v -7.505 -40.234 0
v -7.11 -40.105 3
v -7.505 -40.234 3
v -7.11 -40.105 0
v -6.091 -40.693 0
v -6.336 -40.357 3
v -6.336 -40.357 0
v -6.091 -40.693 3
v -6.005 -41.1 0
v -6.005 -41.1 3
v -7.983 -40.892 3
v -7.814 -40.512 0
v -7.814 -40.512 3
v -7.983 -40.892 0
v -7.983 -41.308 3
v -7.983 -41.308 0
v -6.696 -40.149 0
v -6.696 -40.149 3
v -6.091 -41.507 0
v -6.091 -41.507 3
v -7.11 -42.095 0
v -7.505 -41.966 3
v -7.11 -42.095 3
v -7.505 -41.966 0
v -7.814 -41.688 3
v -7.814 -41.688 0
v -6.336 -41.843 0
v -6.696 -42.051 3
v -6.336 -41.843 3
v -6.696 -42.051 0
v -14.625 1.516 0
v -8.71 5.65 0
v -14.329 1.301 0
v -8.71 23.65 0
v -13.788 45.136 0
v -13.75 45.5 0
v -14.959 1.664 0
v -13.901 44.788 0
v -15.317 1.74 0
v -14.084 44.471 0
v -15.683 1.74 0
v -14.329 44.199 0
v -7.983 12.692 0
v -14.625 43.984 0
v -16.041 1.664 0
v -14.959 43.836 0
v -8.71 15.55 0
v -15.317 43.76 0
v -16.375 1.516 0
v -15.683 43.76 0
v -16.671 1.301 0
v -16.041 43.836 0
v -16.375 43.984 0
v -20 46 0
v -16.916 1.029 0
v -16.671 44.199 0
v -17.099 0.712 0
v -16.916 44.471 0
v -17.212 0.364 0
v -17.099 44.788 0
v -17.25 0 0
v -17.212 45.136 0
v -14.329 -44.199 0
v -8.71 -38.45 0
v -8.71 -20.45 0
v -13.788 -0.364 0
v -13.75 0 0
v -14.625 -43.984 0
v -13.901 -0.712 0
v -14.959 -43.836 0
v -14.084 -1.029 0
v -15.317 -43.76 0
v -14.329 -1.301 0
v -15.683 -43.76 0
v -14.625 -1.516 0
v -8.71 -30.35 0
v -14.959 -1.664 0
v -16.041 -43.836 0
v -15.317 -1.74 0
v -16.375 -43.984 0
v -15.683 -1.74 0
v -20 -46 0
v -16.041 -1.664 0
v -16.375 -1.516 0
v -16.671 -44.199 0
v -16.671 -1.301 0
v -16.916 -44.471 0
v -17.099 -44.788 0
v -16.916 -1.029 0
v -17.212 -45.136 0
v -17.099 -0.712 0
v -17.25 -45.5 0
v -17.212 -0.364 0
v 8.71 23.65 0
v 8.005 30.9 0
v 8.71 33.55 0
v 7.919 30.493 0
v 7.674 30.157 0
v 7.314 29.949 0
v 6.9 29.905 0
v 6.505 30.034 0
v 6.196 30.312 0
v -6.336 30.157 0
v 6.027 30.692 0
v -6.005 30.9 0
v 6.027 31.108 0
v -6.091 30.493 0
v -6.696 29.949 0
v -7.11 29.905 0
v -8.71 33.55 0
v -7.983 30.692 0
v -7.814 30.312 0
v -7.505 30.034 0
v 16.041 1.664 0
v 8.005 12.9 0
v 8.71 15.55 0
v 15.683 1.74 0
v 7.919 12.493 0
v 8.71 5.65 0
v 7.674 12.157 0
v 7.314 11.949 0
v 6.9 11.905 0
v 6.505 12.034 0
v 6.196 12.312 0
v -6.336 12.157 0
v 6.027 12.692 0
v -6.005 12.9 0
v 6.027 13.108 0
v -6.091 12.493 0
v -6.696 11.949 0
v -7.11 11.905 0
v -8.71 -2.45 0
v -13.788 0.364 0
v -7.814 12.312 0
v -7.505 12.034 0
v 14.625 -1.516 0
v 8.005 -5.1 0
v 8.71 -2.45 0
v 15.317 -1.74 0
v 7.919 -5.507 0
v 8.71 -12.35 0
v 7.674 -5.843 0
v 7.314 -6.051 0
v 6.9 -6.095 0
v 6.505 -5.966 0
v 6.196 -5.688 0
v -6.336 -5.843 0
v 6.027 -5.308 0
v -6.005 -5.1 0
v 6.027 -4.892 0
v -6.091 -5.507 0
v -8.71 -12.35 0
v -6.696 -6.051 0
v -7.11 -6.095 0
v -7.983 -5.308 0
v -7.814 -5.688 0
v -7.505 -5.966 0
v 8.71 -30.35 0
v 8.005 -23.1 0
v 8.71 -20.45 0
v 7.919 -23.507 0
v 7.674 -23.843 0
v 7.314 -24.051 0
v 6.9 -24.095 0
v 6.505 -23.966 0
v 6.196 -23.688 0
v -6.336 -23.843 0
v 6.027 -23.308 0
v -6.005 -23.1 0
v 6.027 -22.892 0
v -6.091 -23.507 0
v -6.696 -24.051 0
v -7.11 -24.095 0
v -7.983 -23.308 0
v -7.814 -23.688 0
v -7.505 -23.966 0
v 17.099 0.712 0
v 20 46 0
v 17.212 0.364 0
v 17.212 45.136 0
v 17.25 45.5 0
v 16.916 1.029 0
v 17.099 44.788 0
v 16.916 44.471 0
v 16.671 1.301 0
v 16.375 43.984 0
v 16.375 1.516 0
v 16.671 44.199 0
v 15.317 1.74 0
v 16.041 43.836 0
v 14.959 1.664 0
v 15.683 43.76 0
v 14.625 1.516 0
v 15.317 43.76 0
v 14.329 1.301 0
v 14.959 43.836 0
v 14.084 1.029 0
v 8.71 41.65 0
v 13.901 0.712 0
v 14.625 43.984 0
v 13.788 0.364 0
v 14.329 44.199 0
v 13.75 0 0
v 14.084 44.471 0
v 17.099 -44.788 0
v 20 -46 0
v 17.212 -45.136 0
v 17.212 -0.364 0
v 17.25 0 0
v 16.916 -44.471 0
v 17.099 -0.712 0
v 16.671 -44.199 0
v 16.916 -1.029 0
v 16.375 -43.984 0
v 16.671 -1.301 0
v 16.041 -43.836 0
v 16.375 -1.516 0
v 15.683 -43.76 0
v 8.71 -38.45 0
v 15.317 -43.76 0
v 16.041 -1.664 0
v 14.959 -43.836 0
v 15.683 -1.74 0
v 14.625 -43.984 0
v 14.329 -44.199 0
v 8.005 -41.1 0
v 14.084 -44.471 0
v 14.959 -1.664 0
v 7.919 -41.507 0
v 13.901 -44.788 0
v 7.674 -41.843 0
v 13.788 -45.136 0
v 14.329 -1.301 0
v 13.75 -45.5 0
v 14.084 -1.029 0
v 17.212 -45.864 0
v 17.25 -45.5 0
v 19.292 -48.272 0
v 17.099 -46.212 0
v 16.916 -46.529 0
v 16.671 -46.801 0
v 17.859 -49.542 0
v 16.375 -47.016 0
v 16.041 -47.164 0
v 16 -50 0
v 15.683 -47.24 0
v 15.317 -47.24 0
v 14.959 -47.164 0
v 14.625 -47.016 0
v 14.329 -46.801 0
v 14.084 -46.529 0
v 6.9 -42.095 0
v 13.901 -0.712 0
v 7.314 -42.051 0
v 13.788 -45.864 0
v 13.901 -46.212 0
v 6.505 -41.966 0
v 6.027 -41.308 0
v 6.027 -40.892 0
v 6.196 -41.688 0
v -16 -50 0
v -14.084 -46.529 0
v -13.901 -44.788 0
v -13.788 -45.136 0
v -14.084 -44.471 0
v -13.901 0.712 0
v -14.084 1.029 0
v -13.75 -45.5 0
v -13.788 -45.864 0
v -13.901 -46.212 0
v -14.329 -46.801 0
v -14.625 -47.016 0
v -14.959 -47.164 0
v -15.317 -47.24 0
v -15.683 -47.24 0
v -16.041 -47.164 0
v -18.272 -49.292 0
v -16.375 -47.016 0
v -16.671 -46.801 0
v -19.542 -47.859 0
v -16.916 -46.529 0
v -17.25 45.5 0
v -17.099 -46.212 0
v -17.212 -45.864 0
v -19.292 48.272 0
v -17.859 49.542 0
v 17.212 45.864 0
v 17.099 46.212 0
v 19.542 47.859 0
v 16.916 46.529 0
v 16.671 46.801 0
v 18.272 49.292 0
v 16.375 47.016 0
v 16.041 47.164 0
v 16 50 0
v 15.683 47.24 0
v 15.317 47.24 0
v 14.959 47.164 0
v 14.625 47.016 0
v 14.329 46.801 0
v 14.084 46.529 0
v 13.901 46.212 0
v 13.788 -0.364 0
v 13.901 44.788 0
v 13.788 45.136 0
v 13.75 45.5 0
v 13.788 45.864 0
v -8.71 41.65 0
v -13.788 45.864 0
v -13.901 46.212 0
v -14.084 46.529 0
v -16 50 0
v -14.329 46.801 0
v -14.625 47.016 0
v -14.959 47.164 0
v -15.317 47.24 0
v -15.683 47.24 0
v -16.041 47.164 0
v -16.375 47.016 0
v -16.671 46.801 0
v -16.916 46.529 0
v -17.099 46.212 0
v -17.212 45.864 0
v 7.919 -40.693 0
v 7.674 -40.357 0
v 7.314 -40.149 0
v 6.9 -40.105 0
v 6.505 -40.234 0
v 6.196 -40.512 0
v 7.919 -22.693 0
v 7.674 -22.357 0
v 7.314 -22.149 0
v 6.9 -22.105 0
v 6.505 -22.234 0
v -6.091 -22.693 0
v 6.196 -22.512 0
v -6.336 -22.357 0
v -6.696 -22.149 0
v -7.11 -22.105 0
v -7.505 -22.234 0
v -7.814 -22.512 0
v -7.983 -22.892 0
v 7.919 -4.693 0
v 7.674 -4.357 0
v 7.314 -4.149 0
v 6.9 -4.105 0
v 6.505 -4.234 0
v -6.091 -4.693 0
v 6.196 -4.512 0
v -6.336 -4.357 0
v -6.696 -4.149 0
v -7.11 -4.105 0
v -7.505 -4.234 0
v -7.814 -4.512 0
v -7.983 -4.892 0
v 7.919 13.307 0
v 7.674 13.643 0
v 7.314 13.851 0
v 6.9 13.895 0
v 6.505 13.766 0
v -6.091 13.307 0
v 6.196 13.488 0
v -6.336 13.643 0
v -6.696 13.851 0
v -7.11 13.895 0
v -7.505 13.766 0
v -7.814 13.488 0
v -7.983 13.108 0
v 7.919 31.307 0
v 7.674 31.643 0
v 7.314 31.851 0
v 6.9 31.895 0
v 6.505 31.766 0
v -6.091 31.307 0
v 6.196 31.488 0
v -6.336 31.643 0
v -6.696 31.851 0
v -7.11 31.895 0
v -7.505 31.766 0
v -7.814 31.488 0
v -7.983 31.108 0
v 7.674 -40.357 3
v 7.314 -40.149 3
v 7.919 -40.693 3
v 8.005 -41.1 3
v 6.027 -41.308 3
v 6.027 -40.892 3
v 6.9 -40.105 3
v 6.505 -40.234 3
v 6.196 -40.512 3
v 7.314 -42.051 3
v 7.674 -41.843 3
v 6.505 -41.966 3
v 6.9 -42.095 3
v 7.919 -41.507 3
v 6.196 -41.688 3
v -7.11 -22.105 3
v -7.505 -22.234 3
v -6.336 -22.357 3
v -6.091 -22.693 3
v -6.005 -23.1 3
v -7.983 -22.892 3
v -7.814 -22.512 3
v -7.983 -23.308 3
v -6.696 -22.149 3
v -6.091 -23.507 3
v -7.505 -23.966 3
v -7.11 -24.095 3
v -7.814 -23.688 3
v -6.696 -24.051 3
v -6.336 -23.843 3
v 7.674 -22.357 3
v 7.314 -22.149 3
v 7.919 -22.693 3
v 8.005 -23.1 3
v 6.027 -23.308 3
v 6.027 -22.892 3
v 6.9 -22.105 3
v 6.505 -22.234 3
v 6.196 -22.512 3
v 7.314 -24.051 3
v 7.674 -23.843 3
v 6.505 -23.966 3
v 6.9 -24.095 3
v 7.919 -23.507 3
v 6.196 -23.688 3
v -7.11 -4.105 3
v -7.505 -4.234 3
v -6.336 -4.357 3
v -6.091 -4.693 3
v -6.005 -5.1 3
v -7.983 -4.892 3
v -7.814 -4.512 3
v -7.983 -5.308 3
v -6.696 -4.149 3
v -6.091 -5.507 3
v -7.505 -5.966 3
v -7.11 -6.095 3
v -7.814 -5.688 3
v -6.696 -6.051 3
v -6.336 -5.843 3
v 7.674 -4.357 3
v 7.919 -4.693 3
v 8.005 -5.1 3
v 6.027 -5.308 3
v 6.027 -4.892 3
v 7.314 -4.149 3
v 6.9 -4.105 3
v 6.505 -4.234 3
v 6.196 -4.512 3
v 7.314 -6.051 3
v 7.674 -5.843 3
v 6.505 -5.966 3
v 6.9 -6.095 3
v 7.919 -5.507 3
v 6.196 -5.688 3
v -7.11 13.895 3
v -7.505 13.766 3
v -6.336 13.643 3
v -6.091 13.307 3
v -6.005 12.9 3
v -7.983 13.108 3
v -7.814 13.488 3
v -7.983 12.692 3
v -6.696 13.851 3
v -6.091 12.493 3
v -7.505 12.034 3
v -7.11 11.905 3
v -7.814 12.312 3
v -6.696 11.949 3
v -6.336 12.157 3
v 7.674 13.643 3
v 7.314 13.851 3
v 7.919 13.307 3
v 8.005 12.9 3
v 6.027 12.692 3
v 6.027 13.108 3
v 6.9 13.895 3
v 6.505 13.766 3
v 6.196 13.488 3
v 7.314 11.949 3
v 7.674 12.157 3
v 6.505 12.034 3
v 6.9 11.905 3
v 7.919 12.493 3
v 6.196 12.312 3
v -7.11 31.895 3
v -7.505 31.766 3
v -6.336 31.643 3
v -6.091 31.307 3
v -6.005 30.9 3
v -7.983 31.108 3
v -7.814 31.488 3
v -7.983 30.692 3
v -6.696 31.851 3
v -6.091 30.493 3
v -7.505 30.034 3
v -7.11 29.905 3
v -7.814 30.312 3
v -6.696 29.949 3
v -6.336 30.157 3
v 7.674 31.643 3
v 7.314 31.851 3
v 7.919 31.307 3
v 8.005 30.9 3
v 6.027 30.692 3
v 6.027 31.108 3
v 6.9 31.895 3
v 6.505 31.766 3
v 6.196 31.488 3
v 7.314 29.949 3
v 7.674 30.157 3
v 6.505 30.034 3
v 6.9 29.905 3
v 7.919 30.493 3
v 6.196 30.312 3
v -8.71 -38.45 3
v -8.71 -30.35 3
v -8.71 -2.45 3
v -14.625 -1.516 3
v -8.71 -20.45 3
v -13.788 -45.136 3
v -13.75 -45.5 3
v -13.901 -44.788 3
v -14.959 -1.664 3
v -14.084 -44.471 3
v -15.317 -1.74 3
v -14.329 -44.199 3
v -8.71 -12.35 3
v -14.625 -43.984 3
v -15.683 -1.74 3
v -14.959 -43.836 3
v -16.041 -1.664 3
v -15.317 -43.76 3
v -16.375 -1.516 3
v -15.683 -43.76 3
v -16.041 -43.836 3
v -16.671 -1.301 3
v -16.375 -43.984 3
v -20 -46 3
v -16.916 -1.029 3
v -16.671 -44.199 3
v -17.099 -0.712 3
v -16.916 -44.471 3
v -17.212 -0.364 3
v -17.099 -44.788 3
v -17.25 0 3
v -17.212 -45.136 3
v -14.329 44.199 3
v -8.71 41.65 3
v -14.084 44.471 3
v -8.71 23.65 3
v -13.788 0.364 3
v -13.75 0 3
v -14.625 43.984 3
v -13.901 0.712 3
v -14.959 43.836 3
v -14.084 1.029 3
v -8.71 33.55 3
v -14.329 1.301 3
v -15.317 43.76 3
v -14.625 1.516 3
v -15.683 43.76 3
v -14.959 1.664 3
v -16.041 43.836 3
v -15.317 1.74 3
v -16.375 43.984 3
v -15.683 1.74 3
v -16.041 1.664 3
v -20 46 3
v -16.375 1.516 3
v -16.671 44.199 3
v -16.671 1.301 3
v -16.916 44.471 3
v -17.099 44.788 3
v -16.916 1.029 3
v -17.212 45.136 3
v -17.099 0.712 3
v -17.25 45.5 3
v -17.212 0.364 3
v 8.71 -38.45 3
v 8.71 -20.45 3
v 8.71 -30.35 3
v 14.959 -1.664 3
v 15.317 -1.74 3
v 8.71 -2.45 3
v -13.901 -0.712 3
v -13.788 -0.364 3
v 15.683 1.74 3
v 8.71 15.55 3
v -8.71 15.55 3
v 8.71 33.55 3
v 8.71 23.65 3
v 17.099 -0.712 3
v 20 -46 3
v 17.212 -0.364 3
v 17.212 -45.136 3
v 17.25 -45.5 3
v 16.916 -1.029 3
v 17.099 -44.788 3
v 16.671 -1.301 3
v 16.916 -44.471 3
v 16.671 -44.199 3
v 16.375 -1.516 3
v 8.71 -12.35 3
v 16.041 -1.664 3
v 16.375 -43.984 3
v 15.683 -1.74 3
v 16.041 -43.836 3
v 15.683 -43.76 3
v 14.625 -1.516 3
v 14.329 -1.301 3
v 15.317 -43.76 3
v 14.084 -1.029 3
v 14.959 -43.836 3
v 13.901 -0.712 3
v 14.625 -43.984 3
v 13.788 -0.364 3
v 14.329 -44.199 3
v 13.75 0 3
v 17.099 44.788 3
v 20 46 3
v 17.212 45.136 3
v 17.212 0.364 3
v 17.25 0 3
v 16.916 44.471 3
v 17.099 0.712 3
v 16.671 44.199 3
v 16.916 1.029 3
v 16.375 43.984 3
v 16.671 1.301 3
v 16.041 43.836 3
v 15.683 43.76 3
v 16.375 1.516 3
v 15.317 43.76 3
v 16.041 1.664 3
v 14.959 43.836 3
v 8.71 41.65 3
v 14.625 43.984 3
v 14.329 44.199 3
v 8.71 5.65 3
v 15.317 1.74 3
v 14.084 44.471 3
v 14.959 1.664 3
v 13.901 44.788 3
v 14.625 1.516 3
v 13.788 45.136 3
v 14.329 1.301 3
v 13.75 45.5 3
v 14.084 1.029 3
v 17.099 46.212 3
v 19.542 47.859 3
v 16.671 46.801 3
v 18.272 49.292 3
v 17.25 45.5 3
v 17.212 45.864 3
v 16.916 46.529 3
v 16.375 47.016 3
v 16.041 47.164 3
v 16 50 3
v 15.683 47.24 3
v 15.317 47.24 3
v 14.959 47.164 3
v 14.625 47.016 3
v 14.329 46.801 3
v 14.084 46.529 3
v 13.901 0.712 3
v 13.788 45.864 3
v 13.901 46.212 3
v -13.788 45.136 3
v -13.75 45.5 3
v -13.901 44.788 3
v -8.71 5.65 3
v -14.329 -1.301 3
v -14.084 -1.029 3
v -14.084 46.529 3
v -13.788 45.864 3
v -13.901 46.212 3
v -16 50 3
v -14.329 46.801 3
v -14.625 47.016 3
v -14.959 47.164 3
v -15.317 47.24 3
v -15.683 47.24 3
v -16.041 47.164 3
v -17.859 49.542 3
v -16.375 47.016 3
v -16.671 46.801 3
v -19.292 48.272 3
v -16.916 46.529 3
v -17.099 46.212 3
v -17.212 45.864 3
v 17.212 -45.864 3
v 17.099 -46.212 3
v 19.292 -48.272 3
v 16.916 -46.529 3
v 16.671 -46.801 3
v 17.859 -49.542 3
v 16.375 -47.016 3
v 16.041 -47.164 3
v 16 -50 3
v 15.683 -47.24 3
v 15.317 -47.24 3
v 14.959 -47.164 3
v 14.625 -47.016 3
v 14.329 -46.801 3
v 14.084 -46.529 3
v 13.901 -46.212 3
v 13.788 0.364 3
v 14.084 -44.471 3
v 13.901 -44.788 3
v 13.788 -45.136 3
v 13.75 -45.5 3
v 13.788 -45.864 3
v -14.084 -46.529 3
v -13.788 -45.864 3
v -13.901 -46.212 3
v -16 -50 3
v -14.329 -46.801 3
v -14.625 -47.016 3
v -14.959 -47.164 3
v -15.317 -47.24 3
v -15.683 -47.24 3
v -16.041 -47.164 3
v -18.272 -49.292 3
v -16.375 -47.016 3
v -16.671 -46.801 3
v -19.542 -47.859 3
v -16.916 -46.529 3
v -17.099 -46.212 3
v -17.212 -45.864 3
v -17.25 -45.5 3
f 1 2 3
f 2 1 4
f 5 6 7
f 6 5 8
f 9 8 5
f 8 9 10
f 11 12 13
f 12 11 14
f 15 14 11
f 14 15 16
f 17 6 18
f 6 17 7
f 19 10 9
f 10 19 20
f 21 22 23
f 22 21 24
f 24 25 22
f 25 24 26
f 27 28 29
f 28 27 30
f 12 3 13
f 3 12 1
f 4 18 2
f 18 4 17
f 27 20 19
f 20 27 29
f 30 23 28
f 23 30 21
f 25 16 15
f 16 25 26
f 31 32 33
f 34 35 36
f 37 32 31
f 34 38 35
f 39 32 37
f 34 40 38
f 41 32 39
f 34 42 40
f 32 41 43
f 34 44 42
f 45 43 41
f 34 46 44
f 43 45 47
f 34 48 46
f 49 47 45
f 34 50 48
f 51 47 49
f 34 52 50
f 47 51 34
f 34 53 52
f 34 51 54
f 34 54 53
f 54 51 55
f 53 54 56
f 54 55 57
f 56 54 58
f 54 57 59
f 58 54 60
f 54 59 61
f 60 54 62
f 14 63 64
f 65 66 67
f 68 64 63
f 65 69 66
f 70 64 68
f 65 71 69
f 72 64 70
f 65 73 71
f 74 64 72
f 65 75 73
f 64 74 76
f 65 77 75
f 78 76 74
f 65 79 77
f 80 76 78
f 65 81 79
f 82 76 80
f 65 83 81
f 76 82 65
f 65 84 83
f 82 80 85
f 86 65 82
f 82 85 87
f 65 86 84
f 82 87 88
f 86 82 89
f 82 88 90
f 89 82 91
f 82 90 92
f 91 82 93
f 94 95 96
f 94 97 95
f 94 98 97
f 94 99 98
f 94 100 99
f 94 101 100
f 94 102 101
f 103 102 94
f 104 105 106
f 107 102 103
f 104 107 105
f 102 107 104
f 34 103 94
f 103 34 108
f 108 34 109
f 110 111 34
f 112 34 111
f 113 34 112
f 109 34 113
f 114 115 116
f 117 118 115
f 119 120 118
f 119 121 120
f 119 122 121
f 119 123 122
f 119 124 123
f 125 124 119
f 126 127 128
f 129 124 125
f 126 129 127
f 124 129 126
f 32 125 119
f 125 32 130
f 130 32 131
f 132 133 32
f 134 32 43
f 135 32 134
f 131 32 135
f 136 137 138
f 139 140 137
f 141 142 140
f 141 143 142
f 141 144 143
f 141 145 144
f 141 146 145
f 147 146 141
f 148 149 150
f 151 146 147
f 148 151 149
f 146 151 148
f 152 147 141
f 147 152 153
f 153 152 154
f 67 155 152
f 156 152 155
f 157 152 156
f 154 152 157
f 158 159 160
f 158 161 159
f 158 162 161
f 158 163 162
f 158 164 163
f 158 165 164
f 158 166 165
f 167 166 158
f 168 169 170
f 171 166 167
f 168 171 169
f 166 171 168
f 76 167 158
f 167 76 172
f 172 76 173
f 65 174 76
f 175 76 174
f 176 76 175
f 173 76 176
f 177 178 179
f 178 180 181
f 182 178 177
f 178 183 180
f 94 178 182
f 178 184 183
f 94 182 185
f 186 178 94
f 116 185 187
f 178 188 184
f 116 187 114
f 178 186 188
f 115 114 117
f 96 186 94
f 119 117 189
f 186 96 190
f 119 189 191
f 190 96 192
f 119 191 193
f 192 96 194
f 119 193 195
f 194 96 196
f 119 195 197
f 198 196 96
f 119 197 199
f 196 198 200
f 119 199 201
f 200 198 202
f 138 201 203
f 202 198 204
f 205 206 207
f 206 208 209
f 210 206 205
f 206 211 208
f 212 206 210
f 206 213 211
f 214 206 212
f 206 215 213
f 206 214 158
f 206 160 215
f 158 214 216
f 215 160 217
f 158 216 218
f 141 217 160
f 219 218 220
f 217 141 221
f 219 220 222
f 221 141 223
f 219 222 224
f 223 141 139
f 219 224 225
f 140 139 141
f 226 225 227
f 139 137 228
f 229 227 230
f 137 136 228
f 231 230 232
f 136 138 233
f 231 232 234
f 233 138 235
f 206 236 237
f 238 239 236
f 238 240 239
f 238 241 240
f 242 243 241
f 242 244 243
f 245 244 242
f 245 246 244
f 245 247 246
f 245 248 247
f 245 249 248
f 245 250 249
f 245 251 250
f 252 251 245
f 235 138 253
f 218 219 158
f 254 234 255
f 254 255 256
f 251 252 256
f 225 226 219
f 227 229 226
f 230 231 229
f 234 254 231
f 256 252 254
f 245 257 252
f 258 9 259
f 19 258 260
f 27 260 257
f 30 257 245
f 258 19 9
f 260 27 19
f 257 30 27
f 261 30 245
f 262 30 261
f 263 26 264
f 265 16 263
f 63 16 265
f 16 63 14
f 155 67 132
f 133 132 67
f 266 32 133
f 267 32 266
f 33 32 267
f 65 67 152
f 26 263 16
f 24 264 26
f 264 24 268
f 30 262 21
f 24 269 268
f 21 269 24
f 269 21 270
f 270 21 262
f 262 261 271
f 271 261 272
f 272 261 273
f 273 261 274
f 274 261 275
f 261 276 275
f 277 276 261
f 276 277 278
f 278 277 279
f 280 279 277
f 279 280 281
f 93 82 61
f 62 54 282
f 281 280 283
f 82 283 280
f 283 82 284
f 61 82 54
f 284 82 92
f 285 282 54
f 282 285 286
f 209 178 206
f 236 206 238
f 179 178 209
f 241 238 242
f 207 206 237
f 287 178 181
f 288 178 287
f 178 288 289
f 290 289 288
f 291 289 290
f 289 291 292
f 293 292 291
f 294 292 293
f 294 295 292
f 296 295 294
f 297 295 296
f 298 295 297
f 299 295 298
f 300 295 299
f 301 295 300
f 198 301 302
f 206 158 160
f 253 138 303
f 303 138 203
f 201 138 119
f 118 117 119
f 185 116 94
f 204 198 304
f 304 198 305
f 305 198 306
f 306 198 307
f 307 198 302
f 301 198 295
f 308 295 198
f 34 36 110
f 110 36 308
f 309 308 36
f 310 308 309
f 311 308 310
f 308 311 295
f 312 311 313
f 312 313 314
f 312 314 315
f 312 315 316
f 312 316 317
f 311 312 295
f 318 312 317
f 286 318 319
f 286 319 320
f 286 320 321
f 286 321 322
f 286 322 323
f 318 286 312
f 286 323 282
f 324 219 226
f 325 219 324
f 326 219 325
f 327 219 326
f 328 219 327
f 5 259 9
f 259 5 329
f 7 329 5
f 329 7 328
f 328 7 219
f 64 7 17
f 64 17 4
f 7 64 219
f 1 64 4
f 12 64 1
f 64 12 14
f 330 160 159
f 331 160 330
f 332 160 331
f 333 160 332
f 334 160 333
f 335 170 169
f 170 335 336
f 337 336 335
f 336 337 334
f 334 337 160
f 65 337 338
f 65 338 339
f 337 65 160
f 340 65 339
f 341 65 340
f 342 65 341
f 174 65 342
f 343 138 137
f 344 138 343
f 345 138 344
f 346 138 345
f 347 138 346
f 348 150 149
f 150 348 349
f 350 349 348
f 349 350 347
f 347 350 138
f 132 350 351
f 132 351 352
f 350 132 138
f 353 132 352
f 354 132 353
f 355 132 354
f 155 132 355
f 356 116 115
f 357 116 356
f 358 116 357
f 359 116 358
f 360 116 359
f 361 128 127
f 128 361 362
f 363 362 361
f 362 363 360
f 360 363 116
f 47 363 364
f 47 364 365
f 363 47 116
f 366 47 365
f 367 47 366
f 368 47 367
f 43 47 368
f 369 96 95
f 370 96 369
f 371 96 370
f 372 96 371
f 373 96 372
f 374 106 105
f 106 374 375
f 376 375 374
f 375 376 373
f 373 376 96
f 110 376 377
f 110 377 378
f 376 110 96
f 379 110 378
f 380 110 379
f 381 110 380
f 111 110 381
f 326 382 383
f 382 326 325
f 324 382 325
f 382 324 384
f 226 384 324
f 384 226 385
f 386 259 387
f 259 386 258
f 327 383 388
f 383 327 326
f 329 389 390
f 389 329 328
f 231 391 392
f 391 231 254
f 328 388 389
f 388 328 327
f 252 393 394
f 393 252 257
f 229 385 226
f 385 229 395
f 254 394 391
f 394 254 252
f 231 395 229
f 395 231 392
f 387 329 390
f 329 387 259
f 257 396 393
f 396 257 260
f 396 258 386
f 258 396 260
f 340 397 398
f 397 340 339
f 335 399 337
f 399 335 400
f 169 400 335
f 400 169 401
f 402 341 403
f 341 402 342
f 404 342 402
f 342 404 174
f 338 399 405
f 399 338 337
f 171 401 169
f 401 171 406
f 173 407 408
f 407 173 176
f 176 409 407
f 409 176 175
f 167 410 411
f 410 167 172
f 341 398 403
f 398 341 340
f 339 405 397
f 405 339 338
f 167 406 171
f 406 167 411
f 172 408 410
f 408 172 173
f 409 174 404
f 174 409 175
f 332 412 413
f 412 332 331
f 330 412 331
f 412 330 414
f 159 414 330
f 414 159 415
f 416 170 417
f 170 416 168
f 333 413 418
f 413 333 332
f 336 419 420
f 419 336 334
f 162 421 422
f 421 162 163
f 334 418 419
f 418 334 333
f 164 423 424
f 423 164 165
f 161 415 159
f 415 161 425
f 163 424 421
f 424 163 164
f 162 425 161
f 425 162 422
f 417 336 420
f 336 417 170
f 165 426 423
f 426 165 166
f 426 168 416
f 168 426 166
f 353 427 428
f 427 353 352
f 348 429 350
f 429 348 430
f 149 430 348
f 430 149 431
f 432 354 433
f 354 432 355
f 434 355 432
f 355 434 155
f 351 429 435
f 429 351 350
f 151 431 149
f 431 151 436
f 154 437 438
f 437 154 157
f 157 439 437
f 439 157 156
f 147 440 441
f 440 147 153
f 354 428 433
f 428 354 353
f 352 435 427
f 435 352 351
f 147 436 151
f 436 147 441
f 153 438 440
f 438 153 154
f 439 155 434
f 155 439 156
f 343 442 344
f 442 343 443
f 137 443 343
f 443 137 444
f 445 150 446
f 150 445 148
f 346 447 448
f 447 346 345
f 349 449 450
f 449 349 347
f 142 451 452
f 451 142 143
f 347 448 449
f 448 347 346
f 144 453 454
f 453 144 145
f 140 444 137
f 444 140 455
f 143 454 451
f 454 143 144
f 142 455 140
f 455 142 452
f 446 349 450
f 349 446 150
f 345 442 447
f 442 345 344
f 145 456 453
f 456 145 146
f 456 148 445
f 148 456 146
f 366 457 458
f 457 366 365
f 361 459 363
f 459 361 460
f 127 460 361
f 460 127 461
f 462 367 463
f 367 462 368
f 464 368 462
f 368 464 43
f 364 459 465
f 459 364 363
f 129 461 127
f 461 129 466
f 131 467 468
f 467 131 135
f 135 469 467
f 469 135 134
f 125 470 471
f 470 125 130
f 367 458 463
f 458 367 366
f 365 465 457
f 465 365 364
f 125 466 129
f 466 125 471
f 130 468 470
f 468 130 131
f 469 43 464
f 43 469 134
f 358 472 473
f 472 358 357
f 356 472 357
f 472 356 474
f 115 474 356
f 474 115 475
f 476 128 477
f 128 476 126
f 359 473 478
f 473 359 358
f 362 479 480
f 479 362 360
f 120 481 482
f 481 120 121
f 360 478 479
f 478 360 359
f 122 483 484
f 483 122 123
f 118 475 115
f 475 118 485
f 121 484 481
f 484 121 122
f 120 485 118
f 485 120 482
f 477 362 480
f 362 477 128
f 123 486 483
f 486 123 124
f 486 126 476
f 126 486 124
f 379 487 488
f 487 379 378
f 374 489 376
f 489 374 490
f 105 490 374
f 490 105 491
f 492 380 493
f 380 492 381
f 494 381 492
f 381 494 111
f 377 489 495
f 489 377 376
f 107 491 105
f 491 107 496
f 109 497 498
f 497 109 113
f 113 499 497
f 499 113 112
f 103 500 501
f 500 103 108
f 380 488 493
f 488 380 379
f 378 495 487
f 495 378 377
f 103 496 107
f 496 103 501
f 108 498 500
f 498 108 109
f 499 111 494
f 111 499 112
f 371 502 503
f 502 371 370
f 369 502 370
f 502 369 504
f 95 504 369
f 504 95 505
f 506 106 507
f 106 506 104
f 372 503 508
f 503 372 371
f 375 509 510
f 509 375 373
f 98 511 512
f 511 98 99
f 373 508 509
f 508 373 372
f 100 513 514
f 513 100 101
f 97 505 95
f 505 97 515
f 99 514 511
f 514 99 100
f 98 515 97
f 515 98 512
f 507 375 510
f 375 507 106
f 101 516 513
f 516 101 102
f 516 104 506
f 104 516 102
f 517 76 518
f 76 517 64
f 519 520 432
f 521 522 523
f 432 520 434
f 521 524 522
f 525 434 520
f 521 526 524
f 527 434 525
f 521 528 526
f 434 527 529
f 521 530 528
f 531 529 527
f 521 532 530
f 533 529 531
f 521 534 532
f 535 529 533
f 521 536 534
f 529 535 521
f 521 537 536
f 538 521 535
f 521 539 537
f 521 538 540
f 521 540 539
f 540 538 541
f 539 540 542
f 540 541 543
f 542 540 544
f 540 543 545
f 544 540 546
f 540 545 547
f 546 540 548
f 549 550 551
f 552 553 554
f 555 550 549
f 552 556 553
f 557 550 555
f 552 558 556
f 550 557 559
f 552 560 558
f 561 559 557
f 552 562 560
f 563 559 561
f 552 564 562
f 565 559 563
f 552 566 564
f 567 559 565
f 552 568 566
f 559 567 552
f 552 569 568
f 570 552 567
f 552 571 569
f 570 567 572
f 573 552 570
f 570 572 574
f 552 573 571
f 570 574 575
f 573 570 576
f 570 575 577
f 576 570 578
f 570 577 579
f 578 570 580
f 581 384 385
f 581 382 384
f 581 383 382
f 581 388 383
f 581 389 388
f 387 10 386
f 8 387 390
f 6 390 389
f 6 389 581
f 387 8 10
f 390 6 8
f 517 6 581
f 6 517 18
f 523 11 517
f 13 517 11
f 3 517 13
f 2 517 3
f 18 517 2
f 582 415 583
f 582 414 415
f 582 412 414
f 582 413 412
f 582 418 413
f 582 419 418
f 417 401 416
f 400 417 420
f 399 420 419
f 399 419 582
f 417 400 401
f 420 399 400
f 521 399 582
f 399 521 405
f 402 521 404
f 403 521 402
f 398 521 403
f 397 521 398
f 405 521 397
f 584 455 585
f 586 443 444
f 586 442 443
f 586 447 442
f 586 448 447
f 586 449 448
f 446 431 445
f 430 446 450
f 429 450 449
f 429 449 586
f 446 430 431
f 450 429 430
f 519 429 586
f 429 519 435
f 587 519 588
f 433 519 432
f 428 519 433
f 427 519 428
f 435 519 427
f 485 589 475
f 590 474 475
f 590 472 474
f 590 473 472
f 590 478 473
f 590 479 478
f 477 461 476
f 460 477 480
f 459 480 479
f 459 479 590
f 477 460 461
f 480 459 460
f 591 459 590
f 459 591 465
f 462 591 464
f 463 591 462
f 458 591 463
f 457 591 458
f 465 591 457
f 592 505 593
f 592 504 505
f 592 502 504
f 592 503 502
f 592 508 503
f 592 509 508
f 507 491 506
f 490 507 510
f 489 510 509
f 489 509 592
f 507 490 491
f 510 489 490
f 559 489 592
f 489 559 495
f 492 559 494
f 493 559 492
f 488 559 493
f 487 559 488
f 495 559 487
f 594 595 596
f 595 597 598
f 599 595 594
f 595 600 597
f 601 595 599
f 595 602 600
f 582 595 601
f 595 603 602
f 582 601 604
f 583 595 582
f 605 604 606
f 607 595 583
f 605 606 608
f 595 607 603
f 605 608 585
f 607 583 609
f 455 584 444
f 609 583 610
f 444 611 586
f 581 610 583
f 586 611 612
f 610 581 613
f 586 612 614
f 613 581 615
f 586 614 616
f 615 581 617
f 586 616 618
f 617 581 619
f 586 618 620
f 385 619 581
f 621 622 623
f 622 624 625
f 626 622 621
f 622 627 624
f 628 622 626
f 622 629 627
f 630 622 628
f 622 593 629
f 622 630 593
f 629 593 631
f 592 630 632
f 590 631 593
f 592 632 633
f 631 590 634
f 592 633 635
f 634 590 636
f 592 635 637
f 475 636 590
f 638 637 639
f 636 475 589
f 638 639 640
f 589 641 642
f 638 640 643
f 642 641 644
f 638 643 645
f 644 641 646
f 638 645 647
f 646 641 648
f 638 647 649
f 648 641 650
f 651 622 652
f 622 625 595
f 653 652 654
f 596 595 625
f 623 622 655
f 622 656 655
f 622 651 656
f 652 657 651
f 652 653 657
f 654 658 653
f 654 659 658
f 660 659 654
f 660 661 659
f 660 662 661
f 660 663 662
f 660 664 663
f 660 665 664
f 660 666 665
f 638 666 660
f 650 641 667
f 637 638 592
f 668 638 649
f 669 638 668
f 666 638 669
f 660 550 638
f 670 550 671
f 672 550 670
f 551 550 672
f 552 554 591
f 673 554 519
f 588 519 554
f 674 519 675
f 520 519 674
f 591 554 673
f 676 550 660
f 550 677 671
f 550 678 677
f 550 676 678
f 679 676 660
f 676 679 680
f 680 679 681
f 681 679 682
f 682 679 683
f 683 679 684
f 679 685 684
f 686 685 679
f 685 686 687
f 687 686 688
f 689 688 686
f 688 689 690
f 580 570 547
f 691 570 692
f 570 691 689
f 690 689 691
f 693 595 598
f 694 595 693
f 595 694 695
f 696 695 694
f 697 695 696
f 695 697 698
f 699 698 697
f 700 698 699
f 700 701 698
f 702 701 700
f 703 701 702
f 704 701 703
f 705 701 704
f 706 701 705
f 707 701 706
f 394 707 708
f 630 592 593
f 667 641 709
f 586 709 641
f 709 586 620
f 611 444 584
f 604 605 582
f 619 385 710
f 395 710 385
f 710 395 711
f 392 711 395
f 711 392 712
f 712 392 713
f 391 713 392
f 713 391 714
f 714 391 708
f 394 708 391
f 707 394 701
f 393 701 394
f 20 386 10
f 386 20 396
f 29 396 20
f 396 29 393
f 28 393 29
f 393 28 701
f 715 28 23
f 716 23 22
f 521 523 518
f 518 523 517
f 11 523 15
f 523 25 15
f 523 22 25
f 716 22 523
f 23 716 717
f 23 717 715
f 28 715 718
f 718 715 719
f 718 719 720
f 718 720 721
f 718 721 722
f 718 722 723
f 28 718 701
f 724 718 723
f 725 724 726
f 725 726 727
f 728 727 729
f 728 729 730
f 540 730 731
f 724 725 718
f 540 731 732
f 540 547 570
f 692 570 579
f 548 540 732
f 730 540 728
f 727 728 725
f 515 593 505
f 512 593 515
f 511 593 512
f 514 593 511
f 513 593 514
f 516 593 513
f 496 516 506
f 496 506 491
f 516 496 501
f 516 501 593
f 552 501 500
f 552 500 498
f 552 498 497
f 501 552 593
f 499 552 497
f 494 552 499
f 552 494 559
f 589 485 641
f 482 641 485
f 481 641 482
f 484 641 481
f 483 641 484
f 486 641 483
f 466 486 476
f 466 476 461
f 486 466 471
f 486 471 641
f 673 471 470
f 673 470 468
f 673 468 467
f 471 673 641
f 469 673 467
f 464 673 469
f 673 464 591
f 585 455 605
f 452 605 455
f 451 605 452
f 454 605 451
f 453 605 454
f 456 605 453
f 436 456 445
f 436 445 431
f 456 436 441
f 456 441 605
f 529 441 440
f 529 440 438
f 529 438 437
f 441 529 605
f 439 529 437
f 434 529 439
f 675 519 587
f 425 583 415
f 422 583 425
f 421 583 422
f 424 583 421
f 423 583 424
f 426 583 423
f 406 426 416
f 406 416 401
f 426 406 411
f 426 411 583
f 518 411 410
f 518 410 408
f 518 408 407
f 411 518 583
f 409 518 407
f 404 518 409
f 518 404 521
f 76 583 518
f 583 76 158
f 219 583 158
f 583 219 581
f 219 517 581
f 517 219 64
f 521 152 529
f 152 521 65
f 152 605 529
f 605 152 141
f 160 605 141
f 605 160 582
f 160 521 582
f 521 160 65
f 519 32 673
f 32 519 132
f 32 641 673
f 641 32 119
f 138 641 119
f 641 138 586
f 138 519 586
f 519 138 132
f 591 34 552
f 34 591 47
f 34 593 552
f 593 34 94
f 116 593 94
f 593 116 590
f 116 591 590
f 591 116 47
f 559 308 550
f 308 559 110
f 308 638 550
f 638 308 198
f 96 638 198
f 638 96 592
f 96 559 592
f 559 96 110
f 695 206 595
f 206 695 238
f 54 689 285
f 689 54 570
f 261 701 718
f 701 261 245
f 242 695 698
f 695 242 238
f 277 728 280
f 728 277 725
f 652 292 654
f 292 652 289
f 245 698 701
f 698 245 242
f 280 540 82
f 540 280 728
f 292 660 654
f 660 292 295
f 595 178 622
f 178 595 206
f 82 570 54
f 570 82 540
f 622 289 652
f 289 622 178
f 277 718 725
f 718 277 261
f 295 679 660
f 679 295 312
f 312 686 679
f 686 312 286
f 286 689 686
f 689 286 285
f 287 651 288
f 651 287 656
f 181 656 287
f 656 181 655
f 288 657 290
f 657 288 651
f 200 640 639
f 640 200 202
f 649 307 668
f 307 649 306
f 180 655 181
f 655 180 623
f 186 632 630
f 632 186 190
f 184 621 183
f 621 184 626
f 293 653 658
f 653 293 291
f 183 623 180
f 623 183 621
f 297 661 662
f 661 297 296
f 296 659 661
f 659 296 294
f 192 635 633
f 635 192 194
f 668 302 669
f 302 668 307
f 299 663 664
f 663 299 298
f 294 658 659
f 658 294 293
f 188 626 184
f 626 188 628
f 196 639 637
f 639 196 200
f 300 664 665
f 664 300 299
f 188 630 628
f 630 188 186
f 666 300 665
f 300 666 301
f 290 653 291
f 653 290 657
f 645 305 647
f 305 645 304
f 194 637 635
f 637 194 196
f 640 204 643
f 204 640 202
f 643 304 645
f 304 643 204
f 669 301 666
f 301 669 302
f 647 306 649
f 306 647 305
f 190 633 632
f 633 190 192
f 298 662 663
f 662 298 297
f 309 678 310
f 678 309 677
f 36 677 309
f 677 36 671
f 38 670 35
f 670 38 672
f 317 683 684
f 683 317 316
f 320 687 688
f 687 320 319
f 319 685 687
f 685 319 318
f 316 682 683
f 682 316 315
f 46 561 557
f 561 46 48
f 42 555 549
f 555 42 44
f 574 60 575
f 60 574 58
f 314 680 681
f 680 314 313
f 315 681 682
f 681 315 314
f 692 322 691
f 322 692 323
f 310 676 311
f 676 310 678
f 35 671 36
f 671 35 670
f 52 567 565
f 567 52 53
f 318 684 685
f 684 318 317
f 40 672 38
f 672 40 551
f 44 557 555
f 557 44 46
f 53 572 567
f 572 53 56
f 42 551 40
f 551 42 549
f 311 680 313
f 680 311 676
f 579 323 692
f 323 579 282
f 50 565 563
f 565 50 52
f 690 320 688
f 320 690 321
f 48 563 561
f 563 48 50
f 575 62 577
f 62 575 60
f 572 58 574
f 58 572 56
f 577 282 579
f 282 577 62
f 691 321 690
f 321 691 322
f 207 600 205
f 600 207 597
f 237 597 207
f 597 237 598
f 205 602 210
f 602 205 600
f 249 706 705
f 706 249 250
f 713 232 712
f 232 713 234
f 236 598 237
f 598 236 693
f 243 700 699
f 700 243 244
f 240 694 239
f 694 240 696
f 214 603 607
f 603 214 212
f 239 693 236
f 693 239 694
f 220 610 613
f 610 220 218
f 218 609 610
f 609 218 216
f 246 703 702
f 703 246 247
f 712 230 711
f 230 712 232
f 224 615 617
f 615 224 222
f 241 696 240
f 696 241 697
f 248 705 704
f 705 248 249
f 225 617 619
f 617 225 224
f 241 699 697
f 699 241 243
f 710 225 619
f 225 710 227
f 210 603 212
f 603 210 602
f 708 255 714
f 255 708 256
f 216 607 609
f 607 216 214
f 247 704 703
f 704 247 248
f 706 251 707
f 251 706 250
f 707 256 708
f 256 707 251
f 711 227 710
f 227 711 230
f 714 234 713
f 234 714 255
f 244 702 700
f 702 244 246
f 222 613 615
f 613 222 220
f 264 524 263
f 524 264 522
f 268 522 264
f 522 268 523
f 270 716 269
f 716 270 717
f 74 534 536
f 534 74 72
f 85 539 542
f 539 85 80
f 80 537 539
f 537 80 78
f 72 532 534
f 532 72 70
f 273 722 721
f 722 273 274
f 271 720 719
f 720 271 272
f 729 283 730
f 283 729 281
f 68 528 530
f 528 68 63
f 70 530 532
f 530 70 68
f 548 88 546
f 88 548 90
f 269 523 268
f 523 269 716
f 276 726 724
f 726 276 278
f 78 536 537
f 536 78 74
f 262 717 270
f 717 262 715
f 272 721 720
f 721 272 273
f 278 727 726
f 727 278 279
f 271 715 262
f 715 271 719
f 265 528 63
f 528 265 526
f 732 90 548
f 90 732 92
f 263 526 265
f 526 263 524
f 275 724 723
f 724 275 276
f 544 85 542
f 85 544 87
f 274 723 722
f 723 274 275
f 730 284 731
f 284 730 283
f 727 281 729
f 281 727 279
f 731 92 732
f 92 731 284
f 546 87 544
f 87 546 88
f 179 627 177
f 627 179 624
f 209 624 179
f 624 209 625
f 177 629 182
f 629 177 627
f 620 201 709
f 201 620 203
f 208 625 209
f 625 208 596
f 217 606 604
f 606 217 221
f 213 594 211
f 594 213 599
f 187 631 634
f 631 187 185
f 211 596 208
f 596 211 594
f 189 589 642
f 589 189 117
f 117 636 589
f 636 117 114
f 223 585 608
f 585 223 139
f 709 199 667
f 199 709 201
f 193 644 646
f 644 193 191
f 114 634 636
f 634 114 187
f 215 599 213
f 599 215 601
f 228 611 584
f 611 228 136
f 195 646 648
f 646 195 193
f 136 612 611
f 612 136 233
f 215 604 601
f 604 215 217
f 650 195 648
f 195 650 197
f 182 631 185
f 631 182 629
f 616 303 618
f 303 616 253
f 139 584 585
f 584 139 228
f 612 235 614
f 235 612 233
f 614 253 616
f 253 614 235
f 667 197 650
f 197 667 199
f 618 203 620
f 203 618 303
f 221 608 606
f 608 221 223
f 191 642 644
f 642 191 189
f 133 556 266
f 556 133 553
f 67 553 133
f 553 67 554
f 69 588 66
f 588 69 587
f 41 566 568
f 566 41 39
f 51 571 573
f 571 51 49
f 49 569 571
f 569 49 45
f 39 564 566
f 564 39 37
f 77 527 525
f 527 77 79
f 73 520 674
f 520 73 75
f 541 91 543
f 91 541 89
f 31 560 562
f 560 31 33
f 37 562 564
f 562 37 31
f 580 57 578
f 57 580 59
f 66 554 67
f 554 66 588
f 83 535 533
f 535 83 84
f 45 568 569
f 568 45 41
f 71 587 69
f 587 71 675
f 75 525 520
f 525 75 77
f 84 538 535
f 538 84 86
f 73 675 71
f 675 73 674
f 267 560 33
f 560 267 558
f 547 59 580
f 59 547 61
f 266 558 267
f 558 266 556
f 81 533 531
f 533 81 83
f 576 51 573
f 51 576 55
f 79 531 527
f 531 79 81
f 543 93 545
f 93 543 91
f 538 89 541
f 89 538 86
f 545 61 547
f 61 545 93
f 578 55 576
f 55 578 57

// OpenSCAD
// ==========================
// PARAMETERS (easy to edit)
// ==========================

// Main box
BOX_W = 40;      // width  (X)
BOX_L = 100;     // length (Y)
BOX_H = 3;    
BOX_R = 4;
HOLE_INSET = 4.5;
HOLE_DIAM = 4.5;
HOLE_FN = 30;
PIN_DIST = 3.81;
CON_COUNT = 5;  // items count
CON_PINS = 2;   // pins on connector
MARGIN_Y = 18;



// Main plate with rounded corners
difference(){
    linear_extrude(BOX_H)
        offset(r = BOX_R) 
            offset(r = -BOX_R) 
                square([BOX_W, BOX_L], center = true);
                
    // Optional mounting holes (uncomment if you want them)
     translate([ BOX_W/2 - HOLE_INSET,  BOX_L/2 - HOLE_INSET, -0.1]) 
        hole_M3();
     translate([-BOX_W/2 + HOLE_INSET,  BOX_L/2 - HOLE_INSET, -0.1]) 
        hole_M3();
     translate([ BOX_W/2 - HOLE_INSET, -BOX_L/2 + HOLE_INSET, -0.1]) 
        hole_M3();
     translate([-BOX_W/2 + HOLE_INSET, -BOX_L/2 + HOLE_INSET, -0.1]) 
        hole_M3();

       //center holes
     translate([ BOX_W/2 - HOLE_INSET,  0, -0.1]) 
        hole_M3();
     translate([ -BOX_W/2 + HOLE_INSET,  0, -0.1]) 
        hole_M3();


    
    Y = -(BOX_L / 2)+10;
    
    for (i = [0 : CON_COUNT-1]) {
        y_position = - 5- (CON_COUNT-1) * MARGIN_Y/2 + i * MARGIN_Y;  // centers the whole row
        connector_holes(0, y_position);
        connector_body(0, y_position);
    }
    
/*    
    for( pos_y = [Y:MARGIN_Y:MARGIN_Y*(CON_COUNT-1)]){
        connector_holes(0,pos_y);
        connector_body(0,pos_y);
    }
  */  
}



module connector_holes(xPos,yPos){
    X = xPos;
    Y = yPos;
    holes_between = 3.81*CON_PINS+6.19;
    
    holes_between = 3.81 * (CON_PINS-1)+10+0.2;

    
    translate( [X - holes_between/2, Y -0.1] )
        hole_M2();

    translate( [X + holes_between/2, Y -0.1] )
        hole_M2();
    
    
}


module connector_body(xPos, yPos) {
    body_w = CON_PINS * 3.81 + 9.8;   // total width of the plastic body
    body_l = 8.1;             // depth of the body (Y direction)
    
    y = yPos + 2.55 + body_l/2;
    
    translate([xPos, y, 0])
        linear_extrude(BOX_H)
            translate([-body_w/2, -body_l/2, -0.1])
                square([body_w, body_l]);
}

module connector_body_2(xPos, yPos) {
    body_w = CON_PINS * 3.81 + 10;
    body_l = 8.1;
    
    // body sits below the mounting holes
    translate([xPos, yPos - body_l/2, 0])
        linear_extrude(BOX_H)
            translate([-body_w/2, 0, -0.1])
                square([body_w, body_l]);
}


module hole_M2(){
    cylinder(h = BOX_H + 0.2, d = 2, $fn=15);
}


module hole_M3(){
    cylinder(h = BOX_H + 0.2, d = 3.5, $fn=HOLE_FN);
}


module hole_M4() {
    cylinder(h = BOX_H + 0.2, d = HOLE_DIAM, $fn=HOLE_FN);
}
